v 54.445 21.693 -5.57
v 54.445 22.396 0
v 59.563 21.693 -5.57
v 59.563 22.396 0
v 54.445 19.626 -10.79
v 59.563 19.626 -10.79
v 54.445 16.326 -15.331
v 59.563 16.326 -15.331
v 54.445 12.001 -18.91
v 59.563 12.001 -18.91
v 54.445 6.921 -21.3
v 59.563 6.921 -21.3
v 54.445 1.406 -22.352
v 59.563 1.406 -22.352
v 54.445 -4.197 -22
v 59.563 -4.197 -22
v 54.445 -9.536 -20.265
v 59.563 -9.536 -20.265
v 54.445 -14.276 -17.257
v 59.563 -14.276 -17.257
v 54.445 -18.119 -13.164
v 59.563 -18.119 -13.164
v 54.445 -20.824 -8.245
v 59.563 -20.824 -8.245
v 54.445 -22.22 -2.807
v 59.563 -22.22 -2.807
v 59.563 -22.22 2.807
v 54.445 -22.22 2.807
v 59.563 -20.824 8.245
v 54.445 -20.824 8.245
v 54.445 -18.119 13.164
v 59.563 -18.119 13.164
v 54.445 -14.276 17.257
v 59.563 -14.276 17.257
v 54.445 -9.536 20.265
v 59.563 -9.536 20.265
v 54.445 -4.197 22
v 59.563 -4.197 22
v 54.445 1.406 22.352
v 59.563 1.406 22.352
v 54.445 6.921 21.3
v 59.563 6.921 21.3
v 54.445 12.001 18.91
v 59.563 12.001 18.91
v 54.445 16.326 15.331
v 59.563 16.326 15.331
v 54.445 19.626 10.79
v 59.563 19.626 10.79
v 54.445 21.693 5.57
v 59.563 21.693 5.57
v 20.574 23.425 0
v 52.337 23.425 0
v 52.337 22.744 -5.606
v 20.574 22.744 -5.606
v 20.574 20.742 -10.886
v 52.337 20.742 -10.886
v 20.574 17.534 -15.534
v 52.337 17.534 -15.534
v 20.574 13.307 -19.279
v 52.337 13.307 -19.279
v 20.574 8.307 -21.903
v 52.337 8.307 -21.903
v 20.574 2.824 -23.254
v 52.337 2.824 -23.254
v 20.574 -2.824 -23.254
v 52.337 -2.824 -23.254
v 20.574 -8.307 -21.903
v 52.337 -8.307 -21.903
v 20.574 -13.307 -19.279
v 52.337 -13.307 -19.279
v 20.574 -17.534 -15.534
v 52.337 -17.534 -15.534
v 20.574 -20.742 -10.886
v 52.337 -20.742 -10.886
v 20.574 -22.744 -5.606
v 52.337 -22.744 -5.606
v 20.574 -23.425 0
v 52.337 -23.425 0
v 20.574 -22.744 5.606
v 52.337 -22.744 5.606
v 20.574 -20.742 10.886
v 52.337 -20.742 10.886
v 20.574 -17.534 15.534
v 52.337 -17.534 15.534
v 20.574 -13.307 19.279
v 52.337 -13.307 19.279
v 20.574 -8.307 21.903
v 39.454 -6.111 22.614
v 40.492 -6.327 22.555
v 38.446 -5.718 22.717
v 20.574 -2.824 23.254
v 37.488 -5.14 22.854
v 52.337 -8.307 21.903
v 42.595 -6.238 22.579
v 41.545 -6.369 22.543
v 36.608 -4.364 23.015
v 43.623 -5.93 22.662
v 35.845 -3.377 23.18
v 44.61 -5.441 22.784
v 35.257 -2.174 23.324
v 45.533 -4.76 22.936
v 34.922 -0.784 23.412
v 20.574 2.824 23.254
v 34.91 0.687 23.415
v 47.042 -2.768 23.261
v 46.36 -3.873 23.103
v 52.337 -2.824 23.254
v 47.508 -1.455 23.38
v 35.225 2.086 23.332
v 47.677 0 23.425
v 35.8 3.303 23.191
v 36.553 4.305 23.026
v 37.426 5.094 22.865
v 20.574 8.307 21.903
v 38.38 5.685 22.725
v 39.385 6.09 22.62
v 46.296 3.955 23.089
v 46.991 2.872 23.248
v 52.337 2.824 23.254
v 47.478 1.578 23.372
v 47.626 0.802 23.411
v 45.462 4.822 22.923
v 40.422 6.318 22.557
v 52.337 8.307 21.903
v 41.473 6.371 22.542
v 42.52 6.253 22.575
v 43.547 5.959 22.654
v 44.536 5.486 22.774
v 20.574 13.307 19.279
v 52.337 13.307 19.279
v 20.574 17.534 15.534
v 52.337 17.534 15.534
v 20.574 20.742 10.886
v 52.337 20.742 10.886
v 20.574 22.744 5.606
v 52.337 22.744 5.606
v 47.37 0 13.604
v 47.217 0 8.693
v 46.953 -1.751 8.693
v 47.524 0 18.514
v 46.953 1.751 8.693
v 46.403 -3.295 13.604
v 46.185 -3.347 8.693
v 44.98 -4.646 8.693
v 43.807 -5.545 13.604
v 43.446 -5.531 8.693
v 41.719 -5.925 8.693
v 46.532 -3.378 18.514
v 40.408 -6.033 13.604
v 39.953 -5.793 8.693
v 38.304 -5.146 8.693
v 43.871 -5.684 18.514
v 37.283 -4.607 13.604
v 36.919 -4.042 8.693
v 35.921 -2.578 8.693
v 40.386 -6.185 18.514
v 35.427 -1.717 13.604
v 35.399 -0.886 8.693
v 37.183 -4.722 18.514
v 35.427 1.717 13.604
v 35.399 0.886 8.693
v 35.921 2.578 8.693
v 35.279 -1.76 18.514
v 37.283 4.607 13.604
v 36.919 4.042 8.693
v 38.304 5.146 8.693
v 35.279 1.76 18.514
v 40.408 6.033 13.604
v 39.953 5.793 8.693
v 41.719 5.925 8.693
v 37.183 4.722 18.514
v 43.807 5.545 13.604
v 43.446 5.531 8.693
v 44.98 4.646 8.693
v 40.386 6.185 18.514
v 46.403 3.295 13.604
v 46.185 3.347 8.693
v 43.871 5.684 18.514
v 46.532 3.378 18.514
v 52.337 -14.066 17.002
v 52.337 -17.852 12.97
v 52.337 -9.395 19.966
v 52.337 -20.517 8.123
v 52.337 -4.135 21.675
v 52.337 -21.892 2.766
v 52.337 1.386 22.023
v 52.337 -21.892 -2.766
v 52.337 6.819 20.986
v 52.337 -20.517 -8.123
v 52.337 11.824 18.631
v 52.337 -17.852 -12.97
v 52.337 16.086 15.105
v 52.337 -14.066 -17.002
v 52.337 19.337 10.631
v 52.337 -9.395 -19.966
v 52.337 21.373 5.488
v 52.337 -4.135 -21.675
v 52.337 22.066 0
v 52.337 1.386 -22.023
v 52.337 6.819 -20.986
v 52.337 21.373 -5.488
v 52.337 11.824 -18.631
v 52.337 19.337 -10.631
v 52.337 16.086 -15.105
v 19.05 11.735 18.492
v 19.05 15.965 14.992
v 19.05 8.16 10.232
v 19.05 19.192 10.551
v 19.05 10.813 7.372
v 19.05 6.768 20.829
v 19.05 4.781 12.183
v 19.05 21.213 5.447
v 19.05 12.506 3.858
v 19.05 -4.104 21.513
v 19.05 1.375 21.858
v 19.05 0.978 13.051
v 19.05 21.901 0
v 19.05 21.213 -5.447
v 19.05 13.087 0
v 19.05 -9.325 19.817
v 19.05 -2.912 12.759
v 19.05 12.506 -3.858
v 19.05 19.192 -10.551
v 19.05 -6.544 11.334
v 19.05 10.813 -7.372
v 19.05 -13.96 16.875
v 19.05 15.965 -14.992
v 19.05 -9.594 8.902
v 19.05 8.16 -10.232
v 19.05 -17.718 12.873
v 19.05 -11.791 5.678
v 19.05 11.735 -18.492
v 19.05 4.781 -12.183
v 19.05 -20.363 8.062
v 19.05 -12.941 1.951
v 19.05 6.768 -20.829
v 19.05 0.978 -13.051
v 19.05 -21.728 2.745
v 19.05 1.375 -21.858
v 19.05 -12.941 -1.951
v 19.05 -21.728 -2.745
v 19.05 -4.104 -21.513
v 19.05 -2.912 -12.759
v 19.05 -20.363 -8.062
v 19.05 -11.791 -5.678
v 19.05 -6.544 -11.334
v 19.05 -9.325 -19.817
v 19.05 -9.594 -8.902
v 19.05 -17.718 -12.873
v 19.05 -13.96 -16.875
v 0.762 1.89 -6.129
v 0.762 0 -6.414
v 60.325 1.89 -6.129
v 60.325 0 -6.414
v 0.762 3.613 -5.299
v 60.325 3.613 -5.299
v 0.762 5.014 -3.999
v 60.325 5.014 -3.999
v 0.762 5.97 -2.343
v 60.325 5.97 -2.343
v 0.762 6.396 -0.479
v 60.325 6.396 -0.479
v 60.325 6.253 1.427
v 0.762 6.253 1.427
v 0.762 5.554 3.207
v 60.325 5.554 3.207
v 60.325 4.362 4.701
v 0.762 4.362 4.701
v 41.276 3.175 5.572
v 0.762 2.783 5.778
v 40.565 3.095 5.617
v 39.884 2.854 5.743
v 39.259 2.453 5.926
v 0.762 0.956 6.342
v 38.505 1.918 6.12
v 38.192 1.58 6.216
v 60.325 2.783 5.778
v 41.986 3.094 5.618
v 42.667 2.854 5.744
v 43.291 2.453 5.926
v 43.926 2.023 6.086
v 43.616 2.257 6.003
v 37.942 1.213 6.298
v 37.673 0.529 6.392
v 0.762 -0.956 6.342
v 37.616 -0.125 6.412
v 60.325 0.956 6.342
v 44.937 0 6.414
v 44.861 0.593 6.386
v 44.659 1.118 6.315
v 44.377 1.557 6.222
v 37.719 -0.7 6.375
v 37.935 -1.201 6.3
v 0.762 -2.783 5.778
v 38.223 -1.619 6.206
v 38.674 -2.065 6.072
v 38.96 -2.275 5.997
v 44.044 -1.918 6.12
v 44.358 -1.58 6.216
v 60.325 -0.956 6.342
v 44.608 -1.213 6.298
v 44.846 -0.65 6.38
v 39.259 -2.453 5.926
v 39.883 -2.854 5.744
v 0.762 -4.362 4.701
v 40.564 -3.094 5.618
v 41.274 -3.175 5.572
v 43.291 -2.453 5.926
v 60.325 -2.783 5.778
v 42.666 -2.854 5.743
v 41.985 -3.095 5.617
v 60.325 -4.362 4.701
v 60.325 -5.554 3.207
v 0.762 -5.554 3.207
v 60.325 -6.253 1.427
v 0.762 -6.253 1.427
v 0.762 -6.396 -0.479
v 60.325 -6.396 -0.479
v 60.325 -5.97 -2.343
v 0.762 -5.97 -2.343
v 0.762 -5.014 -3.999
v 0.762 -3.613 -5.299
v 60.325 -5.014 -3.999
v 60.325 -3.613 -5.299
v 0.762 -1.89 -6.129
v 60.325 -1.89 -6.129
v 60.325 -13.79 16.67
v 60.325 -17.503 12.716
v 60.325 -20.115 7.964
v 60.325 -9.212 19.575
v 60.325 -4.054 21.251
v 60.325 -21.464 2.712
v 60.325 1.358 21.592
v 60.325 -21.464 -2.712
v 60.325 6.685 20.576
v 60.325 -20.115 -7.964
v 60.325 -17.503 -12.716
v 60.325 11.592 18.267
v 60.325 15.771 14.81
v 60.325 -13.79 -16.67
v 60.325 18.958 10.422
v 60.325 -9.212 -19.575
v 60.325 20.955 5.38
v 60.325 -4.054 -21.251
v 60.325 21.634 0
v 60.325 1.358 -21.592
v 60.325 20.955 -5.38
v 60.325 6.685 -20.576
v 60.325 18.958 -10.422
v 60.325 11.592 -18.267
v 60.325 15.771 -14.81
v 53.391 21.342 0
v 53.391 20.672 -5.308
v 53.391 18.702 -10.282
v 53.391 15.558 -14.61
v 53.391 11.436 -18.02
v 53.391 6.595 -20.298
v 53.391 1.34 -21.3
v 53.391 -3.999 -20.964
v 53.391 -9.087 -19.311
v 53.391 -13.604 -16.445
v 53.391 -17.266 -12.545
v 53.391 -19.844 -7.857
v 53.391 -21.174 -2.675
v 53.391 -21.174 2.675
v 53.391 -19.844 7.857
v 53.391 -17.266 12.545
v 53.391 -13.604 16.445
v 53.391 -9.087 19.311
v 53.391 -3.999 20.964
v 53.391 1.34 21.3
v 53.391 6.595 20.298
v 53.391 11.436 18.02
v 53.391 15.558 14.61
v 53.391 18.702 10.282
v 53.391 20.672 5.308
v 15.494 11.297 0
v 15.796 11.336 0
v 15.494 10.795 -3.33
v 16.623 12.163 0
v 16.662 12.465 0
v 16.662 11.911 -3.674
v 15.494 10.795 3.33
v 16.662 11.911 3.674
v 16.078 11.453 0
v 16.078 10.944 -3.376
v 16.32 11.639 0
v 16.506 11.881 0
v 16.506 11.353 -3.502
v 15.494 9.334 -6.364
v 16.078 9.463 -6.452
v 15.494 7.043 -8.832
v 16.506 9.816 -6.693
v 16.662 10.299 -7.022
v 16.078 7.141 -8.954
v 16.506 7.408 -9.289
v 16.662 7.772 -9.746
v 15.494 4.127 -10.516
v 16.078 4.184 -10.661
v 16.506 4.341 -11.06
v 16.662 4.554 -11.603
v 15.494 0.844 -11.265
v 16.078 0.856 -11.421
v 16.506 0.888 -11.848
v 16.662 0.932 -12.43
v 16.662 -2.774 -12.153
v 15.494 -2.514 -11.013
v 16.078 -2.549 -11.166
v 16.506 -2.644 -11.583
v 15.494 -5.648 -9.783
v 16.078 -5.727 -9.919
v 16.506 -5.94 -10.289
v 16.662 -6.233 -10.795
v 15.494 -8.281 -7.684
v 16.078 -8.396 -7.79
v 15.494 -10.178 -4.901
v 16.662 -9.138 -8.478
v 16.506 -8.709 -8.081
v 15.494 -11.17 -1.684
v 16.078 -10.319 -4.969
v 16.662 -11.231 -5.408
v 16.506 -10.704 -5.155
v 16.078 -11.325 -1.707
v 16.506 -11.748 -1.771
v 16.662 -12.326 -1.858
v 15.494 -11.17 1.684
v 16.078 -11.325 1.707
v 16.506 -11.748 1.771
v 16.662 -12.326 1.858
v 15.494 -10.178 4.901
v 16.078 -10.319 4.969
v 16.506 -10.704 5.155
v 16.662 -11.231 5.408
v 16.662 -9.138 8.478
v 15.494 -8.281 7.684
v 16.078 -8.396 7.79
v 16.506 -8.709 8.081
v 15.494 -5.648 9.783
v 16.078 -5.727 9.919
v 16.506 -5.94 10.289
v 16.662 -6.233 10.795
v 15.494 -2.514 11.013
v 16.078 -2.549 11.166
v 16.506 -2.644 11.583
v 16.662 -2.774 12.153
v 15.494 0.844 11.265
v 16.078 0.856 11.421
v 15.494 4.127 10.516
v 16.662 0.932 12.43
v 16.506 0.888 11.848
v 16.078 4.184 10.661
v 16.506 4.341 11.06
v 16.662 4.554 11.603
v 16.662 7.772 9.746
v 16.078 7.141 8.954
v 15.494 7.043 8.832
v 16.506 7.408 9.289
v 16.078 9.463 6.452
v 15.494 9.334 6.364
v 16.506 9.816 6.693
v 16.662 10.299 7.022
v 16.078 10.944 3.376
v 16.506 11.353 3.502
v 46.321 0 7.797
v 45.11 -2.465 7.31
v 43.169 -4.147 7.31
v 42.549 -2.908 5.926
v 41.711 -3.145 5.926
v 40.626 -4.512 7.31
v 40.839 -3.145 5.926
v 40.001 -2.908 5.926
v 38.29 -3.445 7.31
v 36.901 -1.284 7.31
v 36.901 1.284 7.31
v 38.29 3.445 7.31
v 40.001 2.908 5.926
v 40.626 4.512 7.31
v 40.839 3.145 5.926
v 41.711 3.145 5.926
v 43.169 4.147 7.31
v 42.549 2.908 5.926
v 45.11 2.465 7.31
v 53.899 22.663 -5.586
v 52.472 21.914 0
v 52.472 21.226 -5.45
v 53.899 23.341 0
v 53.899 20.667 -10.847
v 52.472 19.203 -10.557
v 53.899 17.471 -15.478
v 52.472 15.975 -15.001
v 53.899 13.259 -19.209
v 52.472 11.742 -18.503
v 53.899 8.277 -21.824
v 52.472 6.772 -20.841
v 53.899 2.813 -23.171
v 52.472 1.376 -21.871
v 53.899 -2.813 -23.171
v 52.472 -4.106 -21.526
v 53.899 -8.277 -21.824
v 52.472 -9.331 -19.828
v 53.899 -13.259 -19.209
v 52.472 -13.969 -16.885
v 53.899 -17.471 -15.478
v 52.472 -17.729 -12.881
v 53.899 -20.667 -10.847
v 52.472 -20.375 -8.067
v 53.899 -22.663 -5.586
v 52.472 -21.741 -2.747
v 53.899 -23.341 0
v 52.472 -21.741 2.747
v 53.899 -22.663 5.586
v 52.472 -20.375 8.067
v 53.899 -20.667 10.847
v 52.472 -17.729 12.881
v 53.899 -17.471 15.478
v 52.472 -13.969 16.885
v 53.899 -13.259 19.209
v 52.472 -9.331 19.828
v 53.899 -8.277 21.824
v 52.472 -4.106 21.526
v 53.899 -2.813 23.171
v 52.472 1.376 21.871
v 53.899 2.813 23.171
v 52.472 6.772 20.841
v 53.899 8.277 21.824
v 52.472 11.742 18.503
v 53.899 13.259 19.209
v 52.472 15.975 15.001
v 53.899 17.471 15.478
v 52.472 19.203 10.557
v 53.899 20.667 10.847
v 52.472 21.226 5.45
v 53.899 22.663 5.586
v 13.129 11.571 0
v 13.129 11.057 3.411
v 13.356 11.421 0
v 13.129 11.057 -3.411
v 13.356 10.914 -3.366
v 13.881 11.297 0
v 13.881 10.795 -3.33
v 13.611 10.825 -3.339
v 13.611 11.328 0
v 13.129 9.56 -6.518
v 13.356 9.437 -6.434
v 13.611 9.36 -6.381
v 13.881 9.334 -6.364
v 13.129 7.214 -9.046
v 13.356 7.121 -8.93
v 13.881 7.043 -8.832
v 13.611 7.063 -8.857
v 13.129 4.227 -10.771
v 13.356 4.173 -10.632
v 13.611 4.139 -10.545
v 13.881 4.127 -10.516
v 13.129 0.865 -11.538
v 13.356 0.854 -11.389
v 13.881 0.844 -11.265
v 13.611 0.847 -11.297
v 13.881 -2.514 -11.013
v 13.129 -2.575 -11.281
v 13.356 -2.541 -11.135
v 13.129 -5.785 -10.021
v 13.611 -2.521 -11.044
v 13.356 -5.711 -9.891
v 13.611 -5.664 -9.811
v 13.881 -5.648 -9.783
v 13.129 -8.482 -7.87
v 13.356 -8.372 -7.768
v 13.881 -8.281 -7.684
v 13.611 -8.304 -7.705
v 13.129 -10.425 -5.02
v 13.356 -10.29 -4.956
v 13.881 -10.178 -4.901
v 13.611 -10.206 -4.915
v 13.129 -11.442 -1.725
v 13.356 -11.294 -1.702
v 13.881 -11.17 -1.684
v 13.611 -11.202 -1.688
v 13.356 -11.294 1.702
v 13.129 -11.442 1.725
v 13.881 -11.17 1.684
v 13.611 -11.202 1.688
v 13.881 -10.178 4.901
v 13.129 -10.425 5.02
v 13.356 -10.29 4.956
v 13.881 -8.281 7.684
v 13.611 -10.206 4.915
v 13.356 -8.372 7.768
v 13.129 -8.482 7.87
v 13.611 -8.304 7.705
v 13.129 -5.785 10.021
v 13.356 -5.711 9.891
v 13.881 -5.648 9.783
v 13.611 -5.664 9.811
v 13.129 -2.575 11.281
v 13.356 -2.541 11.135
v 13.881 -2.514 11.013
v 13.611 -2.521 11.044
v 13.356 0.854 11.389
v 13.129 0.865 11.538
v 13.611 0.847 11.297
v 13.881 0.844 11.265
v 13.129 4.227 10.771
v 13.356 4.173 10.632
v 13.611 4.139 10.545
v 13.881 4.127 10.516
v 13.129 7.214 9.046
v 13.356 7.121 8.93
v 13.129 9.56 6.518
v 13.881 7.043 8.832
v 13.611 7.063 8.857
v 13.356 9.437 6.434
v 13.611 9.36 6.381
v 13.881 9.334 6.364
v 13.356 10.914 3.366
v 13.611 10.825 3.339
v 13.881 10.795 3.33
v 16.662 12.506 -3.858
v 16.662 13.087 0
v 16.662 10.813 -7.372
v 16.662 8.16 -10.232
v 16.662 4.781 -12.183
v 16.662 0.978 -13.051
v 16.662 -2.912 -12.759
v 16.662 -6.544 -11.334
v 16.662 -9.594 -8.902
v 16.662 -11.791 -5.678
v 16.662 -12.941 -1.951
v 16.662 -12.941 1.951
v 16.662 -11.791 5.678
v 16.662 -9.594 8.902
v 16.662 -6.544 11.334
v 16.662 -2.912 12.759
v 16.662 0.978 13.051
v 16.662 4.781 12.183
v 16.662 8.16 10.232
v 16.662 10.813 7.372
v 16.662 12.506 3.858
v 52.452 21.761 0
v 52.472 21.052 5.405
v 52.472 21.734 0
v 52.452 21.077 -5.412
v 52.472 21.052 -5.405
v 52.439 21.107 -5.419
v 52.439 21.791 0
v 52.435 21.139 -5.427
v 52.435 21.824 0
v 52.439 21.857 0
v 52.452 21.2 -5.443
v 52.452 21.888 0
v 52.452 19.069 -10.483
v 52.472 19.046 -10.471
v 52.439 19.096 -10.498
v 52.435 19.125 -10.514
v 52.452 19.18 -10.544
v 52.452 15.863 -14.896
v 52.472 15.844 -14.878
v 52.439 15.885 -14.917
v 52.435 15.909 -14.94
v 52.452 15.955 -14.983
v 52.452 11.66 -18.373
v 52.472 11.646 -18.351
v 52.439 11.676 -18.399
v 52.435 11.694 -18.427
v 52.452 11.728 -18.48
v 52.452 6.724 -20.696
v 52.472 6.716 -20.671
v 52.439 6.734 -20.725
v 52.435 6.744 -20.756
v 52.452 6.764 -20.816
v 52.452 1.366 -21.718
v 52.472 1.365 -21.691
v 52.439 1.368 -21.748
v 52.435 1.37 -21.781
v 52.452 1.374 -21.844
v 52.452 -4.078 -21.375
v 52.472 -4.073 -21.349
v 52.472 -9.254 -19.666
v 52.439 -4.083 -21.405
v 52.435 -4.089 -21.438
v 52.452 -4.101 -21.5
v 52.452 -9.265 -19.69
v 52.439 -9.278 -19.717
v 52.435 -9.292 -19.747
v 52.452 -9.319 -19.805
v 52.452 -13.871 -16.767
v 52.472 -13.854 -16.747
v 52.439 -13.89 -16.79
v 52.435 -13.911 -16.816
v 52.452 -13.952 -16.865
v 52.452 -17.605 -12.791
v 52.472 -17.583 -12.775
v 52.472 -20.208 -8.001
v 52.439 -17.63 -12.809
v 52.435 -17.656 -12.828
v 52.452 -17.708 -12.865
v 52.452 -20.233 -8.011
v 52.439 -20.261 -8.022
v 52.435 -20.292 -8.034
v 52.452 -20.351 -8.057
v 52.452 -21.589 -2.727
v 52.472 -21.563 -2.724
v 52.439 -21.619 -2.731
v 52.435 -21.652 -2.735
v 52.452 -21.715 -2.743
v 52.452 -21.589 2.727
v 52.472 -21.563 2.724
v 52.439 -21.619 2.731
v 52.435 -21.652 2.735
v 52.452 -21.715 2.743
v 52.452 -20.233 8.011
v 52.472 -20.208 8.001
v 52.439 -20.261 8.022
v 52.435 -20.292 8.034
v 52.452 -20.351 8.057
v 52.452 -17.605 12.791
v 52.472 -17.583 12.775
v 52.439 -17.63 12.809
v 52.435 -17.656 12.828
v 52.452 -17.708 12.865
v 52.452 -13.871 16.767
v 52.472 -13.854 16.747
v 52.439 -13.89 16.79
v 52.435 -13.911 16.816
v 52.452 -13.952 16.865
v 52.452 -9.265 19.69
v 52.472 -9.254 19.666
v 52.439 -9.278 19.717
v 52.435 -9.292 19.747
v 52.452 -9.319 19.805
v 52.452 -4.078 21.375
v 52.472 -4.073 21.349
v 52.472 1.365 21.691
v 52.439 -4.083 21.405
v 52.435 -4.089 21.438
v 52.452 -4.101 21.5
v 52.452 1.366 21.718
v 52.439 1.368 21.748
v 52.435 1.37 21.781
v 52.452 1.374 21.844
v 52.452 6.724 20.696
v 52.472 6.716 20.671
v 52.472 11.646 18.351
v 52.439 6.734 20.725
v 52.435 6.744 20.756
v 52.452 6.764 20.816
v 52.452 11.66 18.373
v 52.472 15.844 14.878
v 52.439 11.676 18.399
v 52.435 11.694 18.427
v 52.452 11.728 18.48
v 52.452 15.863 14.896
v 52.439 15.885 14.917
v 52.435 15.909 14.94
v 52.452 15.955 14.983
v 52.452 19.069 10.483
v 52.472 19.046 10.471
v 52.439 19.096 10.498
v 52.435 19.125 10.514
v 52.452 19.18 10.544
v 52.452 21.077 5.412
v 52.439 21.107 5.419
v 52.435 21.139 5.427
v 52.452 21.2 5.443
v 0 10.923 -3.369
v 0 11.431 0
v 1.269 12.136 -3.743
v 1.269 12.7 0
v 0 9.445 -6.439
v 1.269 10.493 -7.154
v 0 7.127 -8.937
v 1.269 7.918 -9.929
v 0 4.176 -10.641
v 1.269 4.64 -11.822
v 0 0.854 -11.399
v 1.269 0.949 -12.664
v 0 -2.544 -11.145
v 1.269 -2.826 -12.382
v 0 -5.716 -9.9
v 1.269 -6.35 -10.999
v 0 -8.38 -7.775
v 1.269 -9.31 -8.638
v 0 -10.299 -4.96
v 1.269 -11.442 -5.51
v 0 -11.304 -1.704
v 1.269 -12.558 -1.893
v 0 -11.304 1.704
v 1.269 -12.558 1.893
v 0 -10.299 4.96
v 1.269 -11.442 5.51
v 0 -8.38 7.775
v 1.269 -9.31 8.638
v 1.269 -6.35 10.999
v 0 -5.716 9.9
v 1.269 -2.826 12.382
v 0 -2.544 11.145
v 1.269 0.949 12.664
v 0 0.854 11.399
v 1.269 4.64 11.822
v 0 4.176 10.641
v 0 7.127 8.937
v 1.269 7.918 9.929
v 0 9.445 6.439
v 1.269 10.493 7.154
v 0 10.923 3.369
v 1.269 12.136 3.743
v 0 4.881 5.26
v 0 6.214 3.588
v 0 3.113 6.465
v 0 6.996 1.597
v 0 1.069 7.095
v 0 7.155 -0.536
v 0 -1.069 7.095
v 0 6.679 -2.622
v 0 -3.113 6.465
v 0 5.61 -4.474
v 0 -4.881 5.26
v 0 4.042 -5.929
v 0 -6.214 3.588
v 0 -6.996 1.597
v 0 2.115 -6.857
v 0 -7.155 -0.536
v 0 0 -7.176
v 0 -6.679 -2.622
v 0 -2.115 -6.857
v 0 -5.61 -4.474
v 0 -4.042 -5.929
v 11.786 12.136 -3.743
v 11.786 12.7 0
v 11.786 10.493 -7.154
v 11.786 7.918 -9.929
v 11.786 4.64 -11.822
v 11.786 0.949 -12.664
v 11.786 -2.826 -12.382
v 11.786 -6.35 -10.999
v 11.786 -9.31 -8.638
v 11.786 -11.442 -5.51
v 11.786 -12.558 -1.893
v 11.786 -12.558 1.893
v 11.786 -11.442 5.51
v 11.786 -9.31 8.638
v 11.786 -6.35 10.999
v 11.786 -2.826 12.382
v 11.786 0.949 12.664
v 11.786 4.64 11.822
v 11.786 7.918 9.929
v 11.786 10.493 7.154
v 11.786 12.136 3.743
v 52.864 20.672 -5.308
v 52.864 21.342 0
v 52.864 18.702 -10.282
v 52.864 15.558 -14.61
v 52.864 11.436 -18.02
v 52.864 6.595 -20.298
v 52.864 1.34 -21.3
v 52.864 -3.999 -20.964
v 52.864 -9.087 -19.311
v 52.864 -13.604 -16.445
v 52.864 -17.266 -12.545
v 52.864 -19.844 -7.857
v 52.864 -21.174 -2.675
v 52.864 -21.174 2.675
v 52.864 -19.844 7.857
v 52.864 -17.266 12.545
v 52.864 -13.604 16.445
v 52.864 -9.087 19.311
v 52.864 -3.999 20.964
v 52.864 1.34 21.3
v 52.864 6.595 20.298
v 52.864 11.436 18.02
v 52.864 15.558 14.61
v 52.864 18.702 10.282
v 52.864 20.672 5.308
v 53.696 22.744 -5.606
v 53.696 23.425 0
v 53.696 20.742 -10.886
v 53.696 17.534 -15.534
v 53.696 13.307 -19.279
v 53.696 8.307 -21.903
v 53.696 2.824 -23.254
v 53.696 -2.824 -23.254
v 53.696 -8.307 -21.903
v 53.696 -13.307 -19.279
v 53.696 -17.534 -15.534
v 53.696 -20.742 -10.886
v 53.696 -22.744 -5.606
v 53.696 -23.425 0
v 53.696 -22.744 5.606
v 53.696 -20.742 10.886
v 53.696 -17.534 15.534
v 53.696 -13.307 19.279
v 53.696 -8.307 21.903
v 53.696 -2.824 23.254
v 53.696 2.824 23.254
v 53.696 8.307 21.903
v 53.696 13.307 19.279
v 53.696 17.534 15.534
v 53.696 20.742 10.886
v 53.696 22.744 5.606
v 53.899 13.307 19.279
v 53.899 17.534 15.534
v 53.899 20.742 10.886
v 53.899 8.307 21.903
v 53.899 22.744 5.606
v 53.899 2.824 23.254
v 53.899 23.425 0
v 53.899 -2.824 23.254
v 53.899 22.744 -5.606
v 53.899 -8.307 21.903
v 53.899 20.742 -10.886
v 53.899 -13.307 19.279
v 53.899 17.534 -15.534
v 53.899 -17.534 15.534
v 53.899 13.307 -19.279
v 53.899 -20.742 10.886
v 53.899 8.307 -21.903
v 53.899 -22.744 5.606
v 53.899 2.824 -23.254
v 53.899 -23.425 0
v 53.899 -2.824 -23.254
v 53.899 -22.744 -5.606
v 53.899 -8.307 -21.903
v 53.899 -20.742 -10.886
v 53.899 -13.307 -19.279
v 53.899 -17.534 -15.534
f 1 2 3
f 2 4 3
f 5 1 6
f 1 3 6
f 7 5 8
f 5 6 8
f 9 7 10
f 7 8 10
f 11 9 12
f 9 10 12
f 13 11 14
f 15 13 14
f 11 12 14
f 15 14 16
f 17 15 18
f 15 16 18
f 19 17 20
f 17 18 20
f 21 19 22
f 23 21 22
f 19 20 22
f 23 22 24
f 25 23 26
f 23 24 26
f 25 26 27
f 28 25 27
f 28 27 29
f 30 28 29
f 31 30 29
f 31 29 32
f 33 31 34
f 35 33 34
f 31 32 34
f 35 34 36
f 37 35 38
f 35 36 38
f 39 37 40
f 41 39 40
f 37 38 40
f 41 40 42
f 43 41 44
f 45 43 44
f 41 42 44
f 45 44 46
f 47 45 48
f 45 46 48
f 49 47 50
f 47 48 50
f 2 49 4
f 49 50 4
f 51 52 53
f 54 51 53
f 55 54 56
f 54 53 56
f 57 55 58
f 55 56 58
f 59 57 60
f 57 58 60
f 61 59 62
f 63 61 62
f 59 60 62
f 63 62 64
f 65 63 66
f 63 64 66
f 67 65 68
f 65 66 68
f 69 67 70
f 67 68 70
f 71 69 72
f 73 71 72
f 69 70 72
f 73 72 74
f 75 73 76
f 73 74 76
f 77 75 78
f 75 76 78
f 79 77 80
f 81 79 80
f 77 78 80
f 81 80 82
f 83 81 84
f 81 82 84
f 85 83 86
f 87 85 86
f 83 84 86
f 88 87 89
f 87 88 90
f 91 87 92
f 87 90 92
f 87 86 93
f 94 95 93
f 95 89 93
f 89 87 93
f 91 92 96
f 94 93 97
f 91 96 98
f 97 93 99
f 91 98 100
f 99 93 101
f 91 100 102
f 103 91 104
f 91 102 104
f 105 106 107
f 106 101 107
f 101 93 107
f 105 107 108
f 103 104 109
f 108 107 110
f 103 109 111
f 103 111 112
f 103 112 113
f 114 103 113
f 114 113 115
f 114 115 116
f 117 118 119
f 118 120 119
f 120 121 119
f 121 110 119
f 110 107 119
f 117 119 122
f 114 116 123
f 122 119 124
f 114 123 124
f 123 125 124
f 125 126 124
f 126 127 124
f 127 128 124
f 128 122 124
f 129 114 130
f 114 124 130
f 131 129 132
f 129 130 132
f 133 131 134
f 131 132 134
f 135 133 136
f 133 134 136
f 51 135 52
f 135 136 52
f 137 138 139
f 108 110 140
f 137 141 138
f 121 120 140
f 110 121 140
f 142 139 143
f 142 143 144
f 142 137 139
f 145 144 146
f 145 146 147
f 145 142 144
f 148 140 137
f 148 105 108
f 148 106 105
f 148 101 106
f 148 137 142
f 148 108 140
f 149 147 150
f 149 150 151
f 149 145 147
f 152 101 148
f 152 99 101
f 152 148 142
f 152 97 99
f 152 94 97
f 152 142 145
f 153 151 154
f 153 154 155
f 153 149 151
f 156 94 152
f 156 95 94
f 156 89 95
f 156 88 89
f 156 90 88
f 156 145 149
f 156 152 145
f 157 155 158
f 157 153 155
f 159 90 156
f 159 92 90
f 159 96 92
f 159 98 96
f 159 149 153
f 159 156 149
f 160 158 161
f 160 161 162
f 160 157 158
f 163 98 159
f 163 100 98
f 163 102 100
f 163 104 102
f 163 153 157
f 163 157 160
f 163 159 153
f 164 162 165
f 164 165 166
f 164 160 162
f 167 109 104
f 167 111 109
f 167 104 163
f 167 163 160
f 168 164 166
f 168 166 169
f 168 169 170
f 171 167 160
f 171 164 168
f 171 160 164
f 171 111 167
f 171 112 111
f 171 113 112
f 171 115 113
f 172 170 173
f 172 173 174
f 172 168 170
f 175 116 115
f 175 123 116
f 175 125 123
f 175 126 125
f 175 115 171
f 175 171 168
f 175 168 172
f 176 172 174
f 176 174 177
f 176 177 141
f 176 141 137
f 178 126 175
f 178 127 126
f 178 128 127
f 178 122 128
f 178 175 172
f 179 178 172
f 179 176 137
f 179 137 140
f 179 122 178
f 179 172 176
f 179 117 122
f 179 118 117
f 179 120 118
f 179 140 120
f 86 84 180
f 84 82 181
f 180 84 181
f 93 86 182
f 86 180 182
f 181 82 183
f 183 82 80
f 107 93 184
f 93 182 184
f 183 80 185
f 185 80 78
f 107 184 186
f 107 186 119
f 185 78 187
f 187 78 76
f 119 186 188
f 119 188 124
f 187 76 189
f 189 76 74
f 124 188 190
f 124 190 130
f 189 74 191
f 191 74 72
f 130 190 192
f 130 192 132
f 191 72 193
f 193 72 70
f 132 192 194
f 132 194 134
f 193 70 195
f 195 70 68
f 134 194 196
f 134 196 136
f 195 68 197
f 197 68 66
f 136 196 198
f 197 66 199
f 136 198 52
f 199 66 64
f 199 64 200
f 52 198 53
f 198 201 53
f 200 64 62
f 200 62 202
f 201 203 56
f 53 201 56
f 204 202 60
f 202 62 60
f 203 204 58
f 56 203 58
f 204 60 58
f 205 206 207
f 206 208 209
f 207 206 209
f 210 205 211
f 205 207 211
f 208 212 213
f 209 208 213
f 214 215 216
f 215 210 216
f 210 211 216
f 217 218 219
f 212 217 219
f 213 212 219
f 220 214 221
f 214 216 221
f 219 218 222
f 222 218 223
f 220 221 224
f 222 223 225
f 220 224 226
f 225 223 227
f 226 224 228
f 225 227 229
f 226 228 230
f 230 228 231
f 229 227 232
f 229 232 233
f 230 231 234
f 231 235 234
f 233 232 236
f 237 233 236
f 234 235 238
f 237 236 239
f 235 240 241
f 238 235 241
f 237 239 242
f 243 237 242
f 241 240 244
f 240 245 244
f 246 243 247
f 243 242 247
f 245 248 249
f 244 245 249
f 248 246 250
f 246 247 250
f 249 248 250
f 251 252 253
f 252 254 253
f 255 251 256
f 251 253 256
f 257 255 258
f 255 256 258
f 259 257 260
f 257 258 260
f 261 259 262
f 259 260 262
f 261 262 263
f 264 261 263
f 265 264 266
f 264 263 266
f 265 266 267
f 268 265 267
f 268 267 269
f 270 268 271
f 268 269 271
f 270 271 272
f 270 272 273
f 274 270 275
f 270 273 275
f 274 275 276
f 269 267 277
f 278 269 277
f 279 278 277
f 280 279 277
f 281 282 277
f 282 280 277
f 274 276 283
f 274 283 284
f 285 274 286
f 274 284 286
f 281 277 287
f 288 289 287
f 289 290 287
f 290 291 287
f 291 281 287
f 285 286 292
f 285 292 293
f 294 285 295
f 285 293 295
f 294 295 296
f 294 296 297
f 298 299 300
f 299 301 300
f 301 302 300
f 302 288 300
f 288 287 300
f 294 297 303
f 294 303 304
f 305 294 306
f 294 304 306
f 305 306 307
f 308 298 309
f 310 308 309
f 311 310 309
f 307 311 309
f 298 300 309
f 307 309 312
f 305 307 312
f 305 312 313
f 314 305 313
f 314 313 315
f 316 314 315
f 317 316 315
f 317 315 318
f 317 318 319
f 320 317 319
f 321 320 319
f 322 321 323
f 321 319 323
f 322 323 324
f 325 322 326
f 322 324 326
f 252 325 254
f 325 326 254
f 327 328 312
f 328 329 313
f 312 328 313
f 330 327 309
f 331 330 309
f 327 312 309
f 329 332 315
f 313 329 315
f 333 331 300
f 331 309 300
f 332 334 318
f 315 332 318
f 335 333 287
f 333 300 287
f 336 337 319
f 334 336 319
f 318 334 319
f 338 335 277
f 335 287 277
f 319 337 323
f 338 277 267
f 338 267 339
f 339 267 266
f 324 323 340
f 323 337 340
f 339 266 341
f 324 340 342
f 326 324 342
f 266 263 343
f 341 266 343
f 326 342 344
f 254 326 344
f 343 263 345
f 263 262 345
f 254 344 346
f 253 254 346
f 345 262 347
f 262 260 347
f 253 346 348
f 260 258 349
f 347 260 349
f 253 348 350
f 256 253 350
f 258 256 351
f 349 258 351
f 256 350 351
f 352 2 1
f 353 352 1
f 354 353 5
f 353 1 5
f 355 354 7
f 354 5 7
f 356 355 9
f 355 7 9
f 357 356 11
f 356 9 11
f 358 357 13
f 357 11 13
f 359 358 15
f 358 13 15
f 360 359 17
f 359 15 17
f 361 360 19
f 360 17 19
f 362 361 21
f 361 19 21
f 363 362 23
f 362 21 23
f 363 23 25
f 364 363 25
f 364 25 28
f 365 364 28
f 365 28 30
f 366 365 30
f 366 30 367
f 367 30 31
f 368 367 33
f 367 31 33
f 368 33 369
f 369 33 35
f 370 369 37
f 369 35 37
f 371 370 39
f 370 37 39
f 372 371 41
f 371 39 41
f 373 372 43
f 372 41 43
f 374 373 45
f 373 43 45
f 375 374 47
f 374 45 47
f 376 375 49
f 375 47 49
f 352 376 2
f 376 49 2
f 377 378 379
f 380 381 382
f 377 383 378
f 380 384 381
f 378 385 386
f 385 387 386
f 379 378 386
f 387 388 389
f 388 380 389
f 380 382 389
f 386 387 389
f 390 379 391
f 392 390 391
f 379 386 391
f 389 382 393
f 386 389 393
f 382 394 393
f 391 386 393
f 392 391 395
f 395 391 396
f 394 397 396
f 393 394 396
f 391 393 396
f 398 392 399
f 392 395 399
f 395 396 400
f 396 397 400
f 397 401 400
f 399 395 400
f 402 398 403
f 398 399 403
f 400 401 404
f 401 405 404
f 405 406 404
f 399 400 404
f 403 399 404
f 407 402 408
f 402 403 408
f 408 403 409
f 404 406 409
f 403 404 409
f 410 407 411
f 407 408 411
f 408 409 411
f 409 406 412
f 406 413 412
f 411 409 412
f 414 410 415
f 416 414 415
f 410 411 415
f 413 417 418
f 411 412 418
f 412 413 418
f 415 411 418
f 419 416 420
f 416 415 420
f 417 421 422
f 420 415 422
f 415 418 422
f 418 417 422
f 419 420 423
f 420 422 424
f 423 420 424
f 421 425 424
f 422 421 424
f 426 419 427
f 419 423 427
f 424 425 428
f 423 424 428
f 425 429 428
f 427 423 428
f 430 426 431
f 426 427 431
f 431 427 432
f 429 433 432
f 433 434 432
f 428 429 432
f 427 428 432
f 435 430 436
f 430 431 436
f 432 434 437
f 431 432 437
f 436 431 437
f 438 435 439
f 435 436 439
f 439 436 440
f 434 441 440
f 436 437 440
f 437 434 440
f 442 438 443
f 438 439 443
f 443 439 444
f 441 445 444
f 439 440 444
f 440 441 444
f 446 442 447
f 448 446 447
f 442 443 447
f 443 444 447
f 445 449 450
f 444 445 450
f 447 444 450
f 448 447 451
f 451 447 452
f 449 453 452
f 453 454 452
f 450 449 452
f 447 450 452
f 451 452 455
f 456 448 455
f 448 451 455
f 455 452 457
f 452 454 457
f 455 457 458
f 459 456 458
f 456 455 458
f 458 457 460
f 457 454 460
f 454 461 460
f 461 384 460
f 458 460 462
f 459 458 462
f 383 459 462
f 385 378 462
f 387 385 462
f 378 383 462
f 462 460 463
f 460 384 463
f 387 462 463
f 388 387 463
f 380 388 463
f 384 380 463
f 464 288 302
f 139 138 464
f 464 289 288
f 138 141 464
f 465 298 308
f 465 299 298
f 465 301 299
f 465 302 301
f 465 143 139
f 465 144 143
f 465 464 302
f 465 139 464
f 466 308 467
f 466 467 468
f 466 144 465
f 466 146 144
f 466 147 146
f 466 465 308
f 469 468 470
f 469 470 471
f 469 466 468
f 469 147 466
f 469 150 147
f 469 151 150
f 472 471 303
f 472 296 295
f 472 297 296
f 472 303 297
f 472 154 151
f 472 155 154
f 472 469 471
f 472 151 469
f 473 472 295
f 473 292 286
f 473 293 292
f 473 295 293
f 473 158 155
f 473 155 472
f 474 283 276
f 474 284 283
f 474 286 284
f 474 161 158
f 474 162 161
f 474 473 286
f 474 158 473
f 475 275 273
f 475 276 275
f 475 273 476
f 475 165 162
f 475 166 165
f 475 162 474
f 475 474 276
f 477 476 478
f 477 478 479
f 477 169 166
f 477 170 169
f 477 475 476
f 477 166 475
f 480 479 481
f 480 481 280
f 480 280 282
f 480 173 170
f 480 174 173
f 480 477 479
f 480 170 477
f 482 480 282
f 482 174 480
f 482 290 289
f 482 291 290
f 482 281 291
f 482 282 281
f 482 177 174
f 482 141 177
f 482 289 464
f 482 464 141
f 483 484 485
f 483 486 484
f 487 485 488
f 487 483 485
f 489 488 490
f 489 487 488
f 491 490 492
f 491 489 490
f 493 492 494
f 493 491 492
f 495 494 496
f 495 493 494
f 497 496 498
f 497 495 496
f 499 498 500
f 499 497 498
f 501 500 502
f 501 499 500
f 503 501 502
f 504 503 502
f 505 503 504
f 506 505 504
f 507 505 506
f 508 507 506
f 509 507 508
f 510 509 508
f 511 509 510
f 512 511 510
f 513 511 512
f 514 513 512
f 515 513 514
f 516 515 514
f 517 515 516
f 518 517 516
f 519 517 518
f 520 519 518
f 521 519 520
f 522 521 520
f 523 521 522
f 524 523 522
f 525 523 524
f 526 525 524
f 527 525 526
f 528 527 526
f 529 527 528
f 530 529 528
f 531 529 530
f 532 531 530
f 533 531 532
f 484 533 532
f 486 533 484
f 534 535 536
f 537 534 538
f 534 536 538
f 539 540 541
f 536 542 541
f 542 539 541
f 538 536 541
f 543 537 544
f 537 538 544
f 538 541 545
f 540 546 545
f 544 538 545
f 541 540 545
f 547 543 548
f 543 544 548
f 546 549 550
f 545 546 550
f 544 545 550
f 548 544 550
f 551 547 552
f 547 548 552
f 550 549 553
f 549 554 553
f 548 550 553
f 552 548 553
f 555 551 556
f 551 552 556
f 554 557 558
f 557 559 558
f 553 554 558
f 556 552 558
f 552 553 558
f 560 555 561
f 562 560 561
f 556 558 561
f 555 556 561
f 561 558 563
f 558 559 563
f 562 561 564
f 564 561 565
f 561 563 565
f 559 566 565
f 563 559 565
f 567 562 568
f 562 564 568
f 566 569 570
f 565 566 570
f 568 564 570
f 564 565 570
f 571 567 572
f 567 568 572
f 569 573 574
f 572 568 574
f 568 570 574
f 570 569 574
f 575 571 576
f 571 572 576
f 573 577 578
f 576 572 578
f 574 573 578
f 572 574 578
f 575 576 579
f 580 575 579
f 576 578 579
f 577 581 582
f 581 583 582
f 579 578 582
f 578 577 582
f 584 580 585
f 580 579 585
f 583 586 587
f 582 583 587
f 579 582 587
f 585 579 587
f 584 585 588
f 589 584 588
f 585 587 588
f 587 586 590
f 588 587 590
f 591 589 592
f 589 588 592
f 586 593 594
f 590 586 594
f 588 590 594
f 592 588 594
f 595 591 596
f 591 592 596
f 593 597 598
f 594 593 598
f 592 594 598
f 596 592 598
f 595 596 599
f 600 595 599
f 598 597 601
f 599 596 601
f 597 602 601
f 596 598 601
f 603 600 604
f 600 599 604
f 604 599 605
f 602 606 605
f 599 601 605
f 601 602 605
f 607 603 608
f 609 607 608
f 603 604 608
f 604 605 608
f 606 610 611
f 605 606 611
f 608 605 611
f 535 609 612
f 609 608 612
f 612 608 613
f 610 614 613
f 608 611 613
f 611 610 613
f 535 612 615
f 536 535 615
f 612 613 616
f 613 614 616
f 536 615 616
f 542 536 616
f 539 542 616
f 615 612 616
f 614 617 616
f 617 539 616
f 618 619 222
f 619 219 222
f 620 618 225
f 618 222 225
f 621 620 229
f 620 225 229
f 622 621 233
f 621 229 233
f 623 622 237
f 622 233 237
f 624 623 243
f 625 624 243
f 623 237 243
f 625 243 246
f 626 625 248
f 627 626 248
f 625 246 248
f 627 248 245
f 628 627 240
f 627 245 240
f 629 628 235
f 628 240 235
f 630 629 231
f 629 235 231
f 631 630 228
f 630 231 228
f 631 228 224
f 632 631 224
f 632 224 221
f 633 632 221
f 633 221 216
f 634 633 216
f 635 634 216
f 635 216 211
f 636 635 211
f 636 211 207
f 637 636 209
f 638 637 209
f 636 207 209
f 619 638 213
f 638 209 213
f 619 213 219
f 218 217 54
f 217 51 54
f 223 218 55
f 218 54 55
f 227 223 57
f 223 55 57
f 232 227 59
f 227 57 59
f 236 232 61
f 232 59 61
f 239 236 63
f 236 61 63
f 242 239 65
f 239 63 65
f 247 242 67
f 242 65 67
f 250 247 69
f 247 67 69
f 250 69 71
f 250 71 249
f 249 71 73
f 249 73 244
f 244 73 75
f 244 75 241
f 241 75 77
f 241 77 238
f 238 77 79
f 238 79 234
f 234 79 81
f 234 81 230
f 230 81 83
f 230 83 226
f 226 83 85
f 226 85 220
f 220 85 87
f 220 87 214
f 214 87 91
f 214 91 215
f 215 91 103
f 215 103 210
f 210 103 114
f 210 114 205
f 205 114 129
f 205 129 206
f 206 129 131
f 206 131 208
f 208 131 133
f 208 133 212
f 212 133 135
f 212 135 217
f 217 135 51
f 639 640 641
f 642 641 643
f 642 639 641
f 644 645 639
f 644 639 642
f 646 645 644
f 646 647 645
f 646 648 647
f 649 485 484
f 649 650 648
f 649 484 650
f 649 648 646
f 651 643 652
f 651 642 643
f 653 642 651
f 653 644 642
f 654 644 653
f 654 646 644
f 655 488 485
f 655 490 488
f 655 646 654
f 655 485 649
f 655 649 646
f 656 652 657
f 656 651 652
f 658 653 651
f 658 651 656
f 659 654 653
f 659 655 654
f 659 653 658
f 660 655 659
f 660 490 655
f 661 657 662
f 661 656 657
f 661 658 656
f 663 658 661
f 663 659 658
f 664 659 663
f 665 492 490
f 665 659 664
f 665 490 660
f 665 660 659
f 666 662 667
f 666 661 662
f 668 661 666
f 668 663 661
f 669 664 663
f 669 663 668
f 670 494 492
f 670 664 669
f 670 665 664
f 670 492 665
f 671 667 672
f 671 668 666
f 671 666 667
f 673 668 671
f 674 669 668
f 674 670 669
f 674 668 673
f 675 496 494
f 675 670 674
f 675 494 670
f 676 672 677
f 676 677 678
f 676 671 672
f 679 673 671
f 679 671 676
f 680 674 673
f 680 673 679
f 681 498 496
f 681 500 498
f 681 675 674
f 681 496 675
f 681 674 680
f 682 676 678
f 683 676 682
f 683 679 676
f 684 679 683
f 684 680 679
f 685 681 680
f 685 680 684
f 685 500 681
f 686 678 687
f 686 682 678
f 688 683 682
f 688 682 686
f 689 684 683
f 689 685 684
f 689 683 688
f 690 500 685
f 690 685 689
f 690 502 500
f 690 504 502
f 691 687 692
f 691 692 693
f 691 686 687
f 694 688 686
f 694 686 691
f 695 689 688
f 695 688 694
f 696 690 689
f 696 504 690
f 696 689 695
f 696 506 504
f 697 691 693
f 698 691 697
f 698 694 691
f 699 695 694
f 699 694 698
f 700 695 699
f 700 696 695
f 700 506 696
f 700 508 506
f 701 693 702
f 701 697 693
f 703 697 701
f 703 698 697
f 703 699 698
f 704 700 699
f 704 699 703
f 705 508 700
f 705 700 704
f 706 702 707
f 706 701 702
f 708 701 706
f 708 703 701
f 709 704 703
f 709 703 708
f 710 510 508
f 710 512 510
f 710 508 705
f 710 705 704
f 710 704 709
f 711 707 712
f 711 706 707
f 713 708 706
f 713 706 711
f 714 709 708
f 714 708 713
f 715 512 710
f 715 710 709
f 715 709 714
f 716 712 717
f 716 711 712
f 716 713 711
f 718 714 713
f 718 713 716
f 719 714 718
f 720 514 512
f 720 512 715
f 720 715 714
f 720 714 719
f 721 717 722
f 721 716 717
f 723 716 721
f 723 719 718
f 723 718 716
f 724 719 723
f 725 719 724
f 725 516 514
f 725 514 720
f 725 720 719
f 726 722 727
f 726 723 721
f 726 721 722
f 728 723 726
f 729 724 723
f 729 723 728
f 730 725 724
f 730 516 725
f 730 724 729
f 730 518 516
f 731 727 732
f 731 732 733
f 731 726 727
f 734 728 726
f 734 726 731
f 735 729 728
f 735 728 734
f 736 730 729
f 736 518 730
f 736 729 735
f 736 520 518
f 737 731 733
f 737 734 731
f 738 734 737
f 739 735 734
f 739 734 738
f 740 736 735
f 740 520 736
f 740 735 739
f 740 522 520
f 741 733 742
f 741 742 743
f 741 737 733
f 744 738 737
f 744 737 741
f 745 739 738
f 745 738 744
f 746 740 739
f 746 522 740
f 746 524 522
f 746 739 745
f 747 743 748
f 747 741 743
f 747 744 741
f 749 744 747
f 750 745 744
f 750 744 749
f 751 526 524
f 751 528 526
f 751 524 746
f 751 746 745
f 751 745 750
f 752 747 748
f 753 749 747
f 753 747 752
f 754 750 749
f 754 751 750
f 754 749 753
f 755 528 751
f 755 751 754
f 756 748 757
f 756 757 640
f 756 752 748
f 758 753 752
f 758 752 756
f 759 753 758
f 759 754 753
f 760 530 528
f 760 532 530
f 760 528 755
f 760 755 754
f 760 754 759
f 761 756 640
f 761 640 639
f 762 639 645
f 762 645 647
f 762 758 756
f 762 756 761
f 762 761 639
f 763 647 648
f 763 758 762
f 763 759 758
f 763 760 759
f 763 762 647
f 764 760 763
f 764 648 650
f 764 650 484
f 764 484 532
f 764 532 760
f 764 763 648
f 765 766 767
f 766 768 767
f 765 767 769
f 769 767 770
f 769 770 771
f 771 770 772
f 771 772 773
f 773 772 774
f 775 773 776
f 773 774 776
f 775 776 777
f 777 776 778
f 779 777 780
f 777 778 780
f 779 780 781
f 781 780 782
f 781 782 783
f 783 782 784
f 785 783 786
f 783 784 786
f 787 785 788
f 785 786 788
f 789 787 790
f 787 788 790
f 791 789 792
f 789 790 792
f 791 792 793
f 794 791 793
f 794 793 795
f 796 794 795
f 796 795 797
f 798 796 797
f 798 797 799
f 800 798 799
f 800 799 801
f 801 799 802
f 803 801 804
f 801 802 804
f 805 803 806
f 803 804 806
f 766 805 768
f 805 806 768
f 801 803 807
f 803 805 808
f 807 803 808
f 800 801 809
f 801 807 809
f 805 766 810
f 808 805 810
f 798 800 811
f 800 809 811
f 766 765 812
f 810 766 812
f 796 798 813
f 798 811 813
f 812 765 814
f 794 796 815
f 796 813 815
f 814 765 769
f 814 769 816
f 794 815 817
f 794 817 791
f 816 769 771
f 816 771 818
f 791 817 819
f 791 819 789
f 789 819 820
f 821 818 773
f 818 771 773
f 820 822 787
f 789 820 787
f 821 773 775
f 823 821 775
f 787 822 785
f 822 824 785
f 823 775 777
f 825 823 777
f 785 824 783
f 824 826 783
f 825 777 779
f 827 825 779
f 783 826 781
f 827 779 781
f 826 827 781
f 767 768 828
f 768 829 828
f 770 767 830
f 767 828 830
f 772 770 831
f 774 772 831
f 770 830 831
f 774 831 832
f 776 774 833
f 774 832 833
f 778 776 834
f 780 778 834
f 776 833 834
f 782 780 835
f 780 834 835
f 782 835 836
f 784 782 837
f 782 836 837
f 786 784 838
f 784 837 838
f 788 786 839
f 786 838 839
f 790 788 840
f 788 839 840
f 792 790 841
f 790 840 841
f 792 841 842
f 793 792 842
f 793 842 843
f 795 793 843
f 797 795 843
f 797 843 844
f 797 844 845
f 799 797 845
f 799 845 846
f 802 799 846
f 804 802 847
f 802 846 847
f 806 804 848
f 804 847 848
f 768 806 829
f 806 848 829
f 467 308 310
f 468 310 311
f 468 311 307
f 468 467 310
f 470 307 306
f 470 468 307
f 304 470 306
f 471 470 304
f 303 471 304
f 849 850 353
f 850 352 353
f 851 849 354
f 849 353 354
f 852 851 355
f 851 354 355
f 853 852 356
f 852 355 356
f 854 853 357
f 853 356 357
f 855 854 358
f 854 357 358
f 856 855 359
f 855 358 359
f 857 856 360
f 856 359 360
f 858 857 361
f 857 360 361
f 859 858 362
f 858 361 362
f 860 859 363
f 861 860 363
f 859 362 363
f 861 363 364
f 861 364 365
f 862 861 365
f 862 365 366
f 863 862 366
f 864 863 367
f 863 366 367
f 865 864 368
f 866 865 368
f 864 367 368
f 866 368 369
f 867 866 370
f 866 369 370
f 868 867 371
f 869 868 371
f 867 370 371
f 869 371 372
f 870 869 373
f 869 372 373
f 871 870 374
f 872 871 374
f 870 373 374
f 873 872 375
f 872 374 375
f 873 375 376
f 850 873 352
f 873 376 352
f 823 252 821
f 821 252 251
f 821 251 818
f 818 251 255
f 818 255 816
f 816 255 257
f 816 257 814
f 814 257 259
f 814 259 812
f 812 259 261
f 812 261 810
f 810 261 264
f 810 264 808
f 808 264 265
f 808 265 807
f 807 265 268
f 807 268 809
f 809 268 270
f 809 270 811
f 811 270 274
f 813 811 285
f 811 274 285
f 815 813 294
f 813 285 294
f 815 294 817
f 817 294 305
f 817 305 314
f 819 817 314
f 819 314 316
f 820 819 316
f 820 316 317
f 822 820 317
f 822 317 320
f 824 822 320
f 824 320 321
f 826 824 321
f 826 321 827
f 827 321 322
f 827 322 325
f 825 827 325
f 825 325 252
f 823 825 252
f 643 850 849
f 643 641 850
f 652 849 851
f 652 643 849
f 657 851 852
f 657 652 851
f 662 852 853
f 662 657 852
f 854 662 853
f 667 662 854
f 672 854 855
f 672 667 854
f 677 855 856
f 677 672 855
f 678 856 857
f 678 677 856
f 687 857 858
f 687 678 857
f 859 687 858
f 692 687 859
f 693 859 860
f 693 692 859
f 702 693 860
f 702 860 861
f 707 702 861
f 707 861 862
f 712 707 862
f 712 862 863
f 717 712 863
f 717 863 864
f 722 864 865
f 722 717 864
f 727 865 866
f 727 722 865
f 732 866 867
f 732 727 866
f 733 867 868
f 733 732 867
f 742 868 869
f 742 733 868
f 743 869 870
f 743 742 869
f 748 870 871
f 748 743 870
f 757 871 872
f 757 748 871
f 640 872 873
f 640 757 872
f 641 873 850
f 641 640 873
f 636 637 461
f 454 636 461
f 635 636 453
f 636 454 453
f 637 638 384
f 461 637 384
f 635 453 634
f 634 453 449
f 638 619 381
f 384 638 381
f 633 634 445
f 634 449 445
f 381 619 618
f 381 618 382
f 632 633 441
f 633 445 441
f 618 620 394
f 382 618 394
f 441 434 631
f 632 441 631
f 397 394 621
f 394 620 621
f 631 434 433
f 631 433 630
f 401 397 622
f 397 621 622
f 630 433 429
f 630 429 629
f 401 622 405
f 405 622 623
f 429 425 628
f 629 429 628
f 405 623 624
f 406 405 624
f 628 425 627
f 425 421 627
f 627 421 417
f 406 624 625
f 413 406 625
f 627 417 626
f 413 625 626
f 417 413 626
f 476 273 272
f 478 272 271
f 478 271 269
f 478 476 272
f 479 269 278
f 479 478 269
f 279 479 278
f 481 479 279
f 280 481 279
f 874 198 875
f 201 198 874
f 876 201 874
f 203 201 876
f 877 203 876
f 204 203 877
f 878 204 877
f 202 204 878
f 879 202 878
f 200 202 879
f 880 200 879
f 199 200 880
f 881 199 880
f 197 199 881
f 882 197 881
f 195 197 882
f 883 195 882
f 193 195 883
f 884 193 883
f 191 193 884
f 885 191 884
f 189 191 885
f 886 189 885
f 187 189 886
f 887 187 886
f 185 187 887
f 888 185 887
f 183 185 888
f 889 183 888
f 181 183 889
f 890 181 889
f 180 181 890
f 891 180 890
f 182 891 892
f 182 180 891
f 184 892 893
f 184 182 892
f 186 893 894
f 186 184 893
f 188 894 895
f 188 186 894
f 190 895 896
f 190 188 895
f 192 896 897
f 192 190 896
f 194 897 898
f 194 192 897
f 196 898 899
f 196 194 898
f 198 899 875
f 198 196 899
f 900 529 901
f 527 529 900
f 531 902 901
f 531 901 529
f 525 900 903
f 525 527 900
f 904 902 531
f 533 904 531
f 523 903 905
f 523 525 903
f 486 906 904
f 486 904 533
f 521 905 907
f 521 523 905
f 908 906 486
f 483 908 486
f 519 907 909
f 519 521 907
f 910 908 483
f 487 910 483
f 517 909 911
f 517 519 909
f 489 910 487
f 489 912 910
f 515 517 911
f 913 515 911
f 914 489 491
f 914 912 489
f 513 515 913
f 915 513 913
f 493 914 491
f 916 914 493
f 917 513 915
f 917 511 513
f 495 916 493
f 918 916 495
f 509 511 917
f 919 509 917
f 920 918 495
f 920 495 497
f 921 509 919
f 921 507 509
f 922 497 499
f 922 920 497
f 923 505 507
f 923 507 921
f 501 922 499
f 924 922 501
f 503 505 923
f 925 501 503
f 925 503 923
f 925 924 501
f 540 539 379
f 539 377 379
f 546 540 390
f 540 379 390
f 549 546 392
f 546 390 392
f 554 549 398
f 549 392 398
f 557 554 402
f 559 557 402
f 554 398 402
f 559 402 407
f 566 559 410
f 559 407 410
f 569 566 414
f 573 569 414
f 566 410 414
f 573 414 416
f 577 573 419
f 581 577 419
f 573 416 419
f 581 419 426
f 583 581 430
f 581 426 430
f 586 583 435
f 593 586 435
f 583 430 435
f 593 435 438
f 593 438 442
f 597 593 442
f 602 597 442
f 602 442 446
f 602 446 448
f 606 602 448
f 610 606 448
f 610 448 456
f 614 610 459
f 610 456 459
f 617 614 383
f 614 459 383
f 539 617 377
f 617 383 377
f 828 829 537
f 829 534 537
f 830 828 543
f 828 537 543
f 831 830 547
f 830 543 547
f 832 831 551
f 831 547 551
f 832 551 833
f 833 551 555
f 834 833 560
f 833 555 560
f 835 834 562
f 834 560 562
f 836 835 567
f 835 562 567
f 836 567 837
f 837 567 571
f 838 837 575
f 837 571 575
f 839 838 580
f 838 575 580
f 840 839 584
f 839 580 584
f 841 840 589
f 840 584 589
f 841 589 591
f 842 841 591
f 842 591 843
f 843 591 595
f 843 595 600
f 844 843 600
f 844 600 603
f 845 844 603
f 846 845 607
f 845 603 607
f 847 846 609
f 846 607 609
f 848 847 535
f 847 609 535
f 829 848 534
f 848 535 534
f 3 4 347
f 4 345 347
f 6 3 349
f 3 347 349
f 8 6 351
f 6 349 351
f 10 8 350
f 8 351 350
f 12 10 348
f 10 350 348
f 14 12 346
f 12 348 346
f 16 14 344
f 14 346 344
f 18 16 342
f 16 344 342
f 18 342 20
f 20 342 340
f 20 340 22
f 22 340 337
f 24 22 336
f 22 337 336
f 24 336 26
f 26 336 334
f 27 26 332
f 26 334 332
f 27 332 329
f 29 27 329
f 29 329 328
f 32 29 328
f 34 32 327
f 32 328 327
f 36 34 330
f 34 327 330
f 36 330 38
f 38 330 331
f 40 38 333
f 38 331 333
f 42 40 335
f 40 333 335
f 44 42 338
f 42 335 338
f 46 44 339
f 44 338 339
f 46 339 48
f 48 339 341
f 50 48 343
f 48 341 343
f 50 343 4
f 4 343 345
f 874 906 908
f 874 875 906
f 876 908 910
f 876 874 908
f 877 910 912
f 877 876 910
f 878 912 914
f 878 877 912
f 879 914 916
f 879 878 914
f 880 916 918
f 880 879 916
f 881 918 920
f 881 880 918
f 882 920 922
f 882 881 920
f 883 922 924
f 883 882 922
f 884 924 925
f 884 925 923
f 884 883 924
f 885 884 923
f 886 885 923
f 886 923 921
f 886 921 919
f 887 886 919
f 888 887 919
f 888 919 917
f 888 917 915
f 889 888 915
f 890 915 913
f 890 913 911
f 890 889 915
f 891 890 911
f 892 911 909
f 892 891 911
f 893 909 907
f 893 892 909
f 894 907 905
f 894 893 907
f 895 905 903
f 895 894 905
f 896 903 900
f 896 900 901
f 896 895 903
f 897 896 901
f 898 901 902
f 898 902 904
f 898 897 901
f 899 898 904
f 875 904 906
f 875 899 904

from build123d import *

# Parameters (mm, degrees)
HOLE1_D           = 12.827
HOLE1_CSINK_D     = 14.351
HOLE1_CSINK_ANGLE = 90


with BuildPart() as part:
    # Sketch1 → Revolve1 (revolve)
    with BuildSketch(Plane.XY):
        with BuildLine():
            Line((0, 0), (0, 11.43127))
            Line((0, 11.43127), (1.26873, 12.7))
            Line((1.26873, 12.7), (11.786186437, 12.7))
            Line((11.786186437, 12.7), (13.129150664, 11.570773334))
            ThreePointArc((13.129150664, 11.570773334), (13.480921475, 11.367317925), (13.8811, 11.29665))
            Line((13.8811, 11.29665), (15.494, 11.29665))
            ThreePointArc((15.494, 11.29665), (16.320183563, 11.638866437), (16.6624, 12.46505))
            Line((16.6624, 12.46505), (16.6624, 13.08735))
            Line((16.6624, 13.08735), (19.05, 13.08735))
            Line((19.05, 13.08735), (19.05, 0))
            Line((19.05, 0), (0, 0))
        make_face()
    revolve(axis=Axis((19.05, 0, 0), (-1, 0, 0)))

    # Sketch2 → Revolve2 (revolve)
    with BuildSketch(Plane.XY):
        Polygon((19.05, 0), (19.05, 21.90115), (20.574, 23.42515), (52.3367, 23.42515), (52.3367, 21.34235), (53.3908, 21.34235), (54.4449, 22.39645), (59.563, 22.39645), (60.325, 21.63445), (60.325, 0), align=None)
    revolve(axis=Axis((60.325, 0, 0), (-1, 0, 0)))

    # Hole1 (through all)
    with Locations(Plane.ZY):
        with Locations((0, 0)):
            CounterSinkHole(HOLE1_D / 2, HOLE1_CSINK_D / 2, counter_sink_angle=HOLE1_CSINK_ANGLE)

    # Sketch5 → Cut-Revolve1 (revolve, cut)
    with BuildSketch(Plane(origin=(0, 0, 0), x_dir=(1, 0, 0), z_dir=(0, 1, 0))):
        Polygon((41.275, 0), (44.45, 0), (44.45, -5.926053545), (47.217096455, -8.69315), (47.677022746, -23.42515), (41.275, -23.42515), align=None)
    revolve(axis=Axis((41.275, 0, 23.42515), (0, 0, -1)), mode=Mode.SUBTRACT)

    # Sketch6 → Revolve3 (revolve)
    with BuildSketch(Plane.XY):
        with BuildLine():
            Line((52.3367, 21.08835), (53.3908, 21.08835))
            Line((53.3908, 21.08835), (53.3908, 21.34235))
            Line((53.3908, 21.34235), (52.86375, 21.34235))
            Line((52.86375, 21.34235), (52.471716303, 21.734383697))
            ThreePointArc((52.471716303, 21.734383697), (52.434518864, 21.824186258), (52.471716303, 21.913988819))
            Line((52.471716303, 21.913988819), (53.898709288, 23.340981804))
            Line((53.898709288, 23.340981804), (53.898709288, 23.42515))
            Line((53.898709288, 23.42515), (53.695509288, 23.42515))
            Line((53.695509288, 23.42515), (52.3367, 22.066340712))
            Line((52.3367, 22.066340712), (52.3367, 21.08835))
        make_face()
    revolve(axis=Axis((53.3908, 0, 0), (-1, 0, 0)))


solid = part.part
